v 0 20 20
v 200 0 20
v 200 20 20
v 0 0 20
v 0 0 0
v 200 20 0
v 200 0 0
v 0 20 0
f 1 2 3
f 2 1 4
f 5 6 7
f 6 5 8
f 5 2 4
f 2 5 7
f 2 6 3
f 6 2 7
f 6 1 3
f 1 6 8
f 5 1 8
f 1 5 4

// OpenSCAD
// Beam dimensions
beam_length = 200; // Length of the beam
beam_width = 20;   // Width of the beam
beam_height = 20;  // Height of the beam

/**
 * Creates a simple rectangular beam.
 * @param length The length of the beam.
 * @param width The width of the beam.
 * @param height The height of the beam.
 */
module create_beam(length, width, height) {
    cube([length, width, height]);
}

create_beam(beam_length, beam_width, beam_height);
